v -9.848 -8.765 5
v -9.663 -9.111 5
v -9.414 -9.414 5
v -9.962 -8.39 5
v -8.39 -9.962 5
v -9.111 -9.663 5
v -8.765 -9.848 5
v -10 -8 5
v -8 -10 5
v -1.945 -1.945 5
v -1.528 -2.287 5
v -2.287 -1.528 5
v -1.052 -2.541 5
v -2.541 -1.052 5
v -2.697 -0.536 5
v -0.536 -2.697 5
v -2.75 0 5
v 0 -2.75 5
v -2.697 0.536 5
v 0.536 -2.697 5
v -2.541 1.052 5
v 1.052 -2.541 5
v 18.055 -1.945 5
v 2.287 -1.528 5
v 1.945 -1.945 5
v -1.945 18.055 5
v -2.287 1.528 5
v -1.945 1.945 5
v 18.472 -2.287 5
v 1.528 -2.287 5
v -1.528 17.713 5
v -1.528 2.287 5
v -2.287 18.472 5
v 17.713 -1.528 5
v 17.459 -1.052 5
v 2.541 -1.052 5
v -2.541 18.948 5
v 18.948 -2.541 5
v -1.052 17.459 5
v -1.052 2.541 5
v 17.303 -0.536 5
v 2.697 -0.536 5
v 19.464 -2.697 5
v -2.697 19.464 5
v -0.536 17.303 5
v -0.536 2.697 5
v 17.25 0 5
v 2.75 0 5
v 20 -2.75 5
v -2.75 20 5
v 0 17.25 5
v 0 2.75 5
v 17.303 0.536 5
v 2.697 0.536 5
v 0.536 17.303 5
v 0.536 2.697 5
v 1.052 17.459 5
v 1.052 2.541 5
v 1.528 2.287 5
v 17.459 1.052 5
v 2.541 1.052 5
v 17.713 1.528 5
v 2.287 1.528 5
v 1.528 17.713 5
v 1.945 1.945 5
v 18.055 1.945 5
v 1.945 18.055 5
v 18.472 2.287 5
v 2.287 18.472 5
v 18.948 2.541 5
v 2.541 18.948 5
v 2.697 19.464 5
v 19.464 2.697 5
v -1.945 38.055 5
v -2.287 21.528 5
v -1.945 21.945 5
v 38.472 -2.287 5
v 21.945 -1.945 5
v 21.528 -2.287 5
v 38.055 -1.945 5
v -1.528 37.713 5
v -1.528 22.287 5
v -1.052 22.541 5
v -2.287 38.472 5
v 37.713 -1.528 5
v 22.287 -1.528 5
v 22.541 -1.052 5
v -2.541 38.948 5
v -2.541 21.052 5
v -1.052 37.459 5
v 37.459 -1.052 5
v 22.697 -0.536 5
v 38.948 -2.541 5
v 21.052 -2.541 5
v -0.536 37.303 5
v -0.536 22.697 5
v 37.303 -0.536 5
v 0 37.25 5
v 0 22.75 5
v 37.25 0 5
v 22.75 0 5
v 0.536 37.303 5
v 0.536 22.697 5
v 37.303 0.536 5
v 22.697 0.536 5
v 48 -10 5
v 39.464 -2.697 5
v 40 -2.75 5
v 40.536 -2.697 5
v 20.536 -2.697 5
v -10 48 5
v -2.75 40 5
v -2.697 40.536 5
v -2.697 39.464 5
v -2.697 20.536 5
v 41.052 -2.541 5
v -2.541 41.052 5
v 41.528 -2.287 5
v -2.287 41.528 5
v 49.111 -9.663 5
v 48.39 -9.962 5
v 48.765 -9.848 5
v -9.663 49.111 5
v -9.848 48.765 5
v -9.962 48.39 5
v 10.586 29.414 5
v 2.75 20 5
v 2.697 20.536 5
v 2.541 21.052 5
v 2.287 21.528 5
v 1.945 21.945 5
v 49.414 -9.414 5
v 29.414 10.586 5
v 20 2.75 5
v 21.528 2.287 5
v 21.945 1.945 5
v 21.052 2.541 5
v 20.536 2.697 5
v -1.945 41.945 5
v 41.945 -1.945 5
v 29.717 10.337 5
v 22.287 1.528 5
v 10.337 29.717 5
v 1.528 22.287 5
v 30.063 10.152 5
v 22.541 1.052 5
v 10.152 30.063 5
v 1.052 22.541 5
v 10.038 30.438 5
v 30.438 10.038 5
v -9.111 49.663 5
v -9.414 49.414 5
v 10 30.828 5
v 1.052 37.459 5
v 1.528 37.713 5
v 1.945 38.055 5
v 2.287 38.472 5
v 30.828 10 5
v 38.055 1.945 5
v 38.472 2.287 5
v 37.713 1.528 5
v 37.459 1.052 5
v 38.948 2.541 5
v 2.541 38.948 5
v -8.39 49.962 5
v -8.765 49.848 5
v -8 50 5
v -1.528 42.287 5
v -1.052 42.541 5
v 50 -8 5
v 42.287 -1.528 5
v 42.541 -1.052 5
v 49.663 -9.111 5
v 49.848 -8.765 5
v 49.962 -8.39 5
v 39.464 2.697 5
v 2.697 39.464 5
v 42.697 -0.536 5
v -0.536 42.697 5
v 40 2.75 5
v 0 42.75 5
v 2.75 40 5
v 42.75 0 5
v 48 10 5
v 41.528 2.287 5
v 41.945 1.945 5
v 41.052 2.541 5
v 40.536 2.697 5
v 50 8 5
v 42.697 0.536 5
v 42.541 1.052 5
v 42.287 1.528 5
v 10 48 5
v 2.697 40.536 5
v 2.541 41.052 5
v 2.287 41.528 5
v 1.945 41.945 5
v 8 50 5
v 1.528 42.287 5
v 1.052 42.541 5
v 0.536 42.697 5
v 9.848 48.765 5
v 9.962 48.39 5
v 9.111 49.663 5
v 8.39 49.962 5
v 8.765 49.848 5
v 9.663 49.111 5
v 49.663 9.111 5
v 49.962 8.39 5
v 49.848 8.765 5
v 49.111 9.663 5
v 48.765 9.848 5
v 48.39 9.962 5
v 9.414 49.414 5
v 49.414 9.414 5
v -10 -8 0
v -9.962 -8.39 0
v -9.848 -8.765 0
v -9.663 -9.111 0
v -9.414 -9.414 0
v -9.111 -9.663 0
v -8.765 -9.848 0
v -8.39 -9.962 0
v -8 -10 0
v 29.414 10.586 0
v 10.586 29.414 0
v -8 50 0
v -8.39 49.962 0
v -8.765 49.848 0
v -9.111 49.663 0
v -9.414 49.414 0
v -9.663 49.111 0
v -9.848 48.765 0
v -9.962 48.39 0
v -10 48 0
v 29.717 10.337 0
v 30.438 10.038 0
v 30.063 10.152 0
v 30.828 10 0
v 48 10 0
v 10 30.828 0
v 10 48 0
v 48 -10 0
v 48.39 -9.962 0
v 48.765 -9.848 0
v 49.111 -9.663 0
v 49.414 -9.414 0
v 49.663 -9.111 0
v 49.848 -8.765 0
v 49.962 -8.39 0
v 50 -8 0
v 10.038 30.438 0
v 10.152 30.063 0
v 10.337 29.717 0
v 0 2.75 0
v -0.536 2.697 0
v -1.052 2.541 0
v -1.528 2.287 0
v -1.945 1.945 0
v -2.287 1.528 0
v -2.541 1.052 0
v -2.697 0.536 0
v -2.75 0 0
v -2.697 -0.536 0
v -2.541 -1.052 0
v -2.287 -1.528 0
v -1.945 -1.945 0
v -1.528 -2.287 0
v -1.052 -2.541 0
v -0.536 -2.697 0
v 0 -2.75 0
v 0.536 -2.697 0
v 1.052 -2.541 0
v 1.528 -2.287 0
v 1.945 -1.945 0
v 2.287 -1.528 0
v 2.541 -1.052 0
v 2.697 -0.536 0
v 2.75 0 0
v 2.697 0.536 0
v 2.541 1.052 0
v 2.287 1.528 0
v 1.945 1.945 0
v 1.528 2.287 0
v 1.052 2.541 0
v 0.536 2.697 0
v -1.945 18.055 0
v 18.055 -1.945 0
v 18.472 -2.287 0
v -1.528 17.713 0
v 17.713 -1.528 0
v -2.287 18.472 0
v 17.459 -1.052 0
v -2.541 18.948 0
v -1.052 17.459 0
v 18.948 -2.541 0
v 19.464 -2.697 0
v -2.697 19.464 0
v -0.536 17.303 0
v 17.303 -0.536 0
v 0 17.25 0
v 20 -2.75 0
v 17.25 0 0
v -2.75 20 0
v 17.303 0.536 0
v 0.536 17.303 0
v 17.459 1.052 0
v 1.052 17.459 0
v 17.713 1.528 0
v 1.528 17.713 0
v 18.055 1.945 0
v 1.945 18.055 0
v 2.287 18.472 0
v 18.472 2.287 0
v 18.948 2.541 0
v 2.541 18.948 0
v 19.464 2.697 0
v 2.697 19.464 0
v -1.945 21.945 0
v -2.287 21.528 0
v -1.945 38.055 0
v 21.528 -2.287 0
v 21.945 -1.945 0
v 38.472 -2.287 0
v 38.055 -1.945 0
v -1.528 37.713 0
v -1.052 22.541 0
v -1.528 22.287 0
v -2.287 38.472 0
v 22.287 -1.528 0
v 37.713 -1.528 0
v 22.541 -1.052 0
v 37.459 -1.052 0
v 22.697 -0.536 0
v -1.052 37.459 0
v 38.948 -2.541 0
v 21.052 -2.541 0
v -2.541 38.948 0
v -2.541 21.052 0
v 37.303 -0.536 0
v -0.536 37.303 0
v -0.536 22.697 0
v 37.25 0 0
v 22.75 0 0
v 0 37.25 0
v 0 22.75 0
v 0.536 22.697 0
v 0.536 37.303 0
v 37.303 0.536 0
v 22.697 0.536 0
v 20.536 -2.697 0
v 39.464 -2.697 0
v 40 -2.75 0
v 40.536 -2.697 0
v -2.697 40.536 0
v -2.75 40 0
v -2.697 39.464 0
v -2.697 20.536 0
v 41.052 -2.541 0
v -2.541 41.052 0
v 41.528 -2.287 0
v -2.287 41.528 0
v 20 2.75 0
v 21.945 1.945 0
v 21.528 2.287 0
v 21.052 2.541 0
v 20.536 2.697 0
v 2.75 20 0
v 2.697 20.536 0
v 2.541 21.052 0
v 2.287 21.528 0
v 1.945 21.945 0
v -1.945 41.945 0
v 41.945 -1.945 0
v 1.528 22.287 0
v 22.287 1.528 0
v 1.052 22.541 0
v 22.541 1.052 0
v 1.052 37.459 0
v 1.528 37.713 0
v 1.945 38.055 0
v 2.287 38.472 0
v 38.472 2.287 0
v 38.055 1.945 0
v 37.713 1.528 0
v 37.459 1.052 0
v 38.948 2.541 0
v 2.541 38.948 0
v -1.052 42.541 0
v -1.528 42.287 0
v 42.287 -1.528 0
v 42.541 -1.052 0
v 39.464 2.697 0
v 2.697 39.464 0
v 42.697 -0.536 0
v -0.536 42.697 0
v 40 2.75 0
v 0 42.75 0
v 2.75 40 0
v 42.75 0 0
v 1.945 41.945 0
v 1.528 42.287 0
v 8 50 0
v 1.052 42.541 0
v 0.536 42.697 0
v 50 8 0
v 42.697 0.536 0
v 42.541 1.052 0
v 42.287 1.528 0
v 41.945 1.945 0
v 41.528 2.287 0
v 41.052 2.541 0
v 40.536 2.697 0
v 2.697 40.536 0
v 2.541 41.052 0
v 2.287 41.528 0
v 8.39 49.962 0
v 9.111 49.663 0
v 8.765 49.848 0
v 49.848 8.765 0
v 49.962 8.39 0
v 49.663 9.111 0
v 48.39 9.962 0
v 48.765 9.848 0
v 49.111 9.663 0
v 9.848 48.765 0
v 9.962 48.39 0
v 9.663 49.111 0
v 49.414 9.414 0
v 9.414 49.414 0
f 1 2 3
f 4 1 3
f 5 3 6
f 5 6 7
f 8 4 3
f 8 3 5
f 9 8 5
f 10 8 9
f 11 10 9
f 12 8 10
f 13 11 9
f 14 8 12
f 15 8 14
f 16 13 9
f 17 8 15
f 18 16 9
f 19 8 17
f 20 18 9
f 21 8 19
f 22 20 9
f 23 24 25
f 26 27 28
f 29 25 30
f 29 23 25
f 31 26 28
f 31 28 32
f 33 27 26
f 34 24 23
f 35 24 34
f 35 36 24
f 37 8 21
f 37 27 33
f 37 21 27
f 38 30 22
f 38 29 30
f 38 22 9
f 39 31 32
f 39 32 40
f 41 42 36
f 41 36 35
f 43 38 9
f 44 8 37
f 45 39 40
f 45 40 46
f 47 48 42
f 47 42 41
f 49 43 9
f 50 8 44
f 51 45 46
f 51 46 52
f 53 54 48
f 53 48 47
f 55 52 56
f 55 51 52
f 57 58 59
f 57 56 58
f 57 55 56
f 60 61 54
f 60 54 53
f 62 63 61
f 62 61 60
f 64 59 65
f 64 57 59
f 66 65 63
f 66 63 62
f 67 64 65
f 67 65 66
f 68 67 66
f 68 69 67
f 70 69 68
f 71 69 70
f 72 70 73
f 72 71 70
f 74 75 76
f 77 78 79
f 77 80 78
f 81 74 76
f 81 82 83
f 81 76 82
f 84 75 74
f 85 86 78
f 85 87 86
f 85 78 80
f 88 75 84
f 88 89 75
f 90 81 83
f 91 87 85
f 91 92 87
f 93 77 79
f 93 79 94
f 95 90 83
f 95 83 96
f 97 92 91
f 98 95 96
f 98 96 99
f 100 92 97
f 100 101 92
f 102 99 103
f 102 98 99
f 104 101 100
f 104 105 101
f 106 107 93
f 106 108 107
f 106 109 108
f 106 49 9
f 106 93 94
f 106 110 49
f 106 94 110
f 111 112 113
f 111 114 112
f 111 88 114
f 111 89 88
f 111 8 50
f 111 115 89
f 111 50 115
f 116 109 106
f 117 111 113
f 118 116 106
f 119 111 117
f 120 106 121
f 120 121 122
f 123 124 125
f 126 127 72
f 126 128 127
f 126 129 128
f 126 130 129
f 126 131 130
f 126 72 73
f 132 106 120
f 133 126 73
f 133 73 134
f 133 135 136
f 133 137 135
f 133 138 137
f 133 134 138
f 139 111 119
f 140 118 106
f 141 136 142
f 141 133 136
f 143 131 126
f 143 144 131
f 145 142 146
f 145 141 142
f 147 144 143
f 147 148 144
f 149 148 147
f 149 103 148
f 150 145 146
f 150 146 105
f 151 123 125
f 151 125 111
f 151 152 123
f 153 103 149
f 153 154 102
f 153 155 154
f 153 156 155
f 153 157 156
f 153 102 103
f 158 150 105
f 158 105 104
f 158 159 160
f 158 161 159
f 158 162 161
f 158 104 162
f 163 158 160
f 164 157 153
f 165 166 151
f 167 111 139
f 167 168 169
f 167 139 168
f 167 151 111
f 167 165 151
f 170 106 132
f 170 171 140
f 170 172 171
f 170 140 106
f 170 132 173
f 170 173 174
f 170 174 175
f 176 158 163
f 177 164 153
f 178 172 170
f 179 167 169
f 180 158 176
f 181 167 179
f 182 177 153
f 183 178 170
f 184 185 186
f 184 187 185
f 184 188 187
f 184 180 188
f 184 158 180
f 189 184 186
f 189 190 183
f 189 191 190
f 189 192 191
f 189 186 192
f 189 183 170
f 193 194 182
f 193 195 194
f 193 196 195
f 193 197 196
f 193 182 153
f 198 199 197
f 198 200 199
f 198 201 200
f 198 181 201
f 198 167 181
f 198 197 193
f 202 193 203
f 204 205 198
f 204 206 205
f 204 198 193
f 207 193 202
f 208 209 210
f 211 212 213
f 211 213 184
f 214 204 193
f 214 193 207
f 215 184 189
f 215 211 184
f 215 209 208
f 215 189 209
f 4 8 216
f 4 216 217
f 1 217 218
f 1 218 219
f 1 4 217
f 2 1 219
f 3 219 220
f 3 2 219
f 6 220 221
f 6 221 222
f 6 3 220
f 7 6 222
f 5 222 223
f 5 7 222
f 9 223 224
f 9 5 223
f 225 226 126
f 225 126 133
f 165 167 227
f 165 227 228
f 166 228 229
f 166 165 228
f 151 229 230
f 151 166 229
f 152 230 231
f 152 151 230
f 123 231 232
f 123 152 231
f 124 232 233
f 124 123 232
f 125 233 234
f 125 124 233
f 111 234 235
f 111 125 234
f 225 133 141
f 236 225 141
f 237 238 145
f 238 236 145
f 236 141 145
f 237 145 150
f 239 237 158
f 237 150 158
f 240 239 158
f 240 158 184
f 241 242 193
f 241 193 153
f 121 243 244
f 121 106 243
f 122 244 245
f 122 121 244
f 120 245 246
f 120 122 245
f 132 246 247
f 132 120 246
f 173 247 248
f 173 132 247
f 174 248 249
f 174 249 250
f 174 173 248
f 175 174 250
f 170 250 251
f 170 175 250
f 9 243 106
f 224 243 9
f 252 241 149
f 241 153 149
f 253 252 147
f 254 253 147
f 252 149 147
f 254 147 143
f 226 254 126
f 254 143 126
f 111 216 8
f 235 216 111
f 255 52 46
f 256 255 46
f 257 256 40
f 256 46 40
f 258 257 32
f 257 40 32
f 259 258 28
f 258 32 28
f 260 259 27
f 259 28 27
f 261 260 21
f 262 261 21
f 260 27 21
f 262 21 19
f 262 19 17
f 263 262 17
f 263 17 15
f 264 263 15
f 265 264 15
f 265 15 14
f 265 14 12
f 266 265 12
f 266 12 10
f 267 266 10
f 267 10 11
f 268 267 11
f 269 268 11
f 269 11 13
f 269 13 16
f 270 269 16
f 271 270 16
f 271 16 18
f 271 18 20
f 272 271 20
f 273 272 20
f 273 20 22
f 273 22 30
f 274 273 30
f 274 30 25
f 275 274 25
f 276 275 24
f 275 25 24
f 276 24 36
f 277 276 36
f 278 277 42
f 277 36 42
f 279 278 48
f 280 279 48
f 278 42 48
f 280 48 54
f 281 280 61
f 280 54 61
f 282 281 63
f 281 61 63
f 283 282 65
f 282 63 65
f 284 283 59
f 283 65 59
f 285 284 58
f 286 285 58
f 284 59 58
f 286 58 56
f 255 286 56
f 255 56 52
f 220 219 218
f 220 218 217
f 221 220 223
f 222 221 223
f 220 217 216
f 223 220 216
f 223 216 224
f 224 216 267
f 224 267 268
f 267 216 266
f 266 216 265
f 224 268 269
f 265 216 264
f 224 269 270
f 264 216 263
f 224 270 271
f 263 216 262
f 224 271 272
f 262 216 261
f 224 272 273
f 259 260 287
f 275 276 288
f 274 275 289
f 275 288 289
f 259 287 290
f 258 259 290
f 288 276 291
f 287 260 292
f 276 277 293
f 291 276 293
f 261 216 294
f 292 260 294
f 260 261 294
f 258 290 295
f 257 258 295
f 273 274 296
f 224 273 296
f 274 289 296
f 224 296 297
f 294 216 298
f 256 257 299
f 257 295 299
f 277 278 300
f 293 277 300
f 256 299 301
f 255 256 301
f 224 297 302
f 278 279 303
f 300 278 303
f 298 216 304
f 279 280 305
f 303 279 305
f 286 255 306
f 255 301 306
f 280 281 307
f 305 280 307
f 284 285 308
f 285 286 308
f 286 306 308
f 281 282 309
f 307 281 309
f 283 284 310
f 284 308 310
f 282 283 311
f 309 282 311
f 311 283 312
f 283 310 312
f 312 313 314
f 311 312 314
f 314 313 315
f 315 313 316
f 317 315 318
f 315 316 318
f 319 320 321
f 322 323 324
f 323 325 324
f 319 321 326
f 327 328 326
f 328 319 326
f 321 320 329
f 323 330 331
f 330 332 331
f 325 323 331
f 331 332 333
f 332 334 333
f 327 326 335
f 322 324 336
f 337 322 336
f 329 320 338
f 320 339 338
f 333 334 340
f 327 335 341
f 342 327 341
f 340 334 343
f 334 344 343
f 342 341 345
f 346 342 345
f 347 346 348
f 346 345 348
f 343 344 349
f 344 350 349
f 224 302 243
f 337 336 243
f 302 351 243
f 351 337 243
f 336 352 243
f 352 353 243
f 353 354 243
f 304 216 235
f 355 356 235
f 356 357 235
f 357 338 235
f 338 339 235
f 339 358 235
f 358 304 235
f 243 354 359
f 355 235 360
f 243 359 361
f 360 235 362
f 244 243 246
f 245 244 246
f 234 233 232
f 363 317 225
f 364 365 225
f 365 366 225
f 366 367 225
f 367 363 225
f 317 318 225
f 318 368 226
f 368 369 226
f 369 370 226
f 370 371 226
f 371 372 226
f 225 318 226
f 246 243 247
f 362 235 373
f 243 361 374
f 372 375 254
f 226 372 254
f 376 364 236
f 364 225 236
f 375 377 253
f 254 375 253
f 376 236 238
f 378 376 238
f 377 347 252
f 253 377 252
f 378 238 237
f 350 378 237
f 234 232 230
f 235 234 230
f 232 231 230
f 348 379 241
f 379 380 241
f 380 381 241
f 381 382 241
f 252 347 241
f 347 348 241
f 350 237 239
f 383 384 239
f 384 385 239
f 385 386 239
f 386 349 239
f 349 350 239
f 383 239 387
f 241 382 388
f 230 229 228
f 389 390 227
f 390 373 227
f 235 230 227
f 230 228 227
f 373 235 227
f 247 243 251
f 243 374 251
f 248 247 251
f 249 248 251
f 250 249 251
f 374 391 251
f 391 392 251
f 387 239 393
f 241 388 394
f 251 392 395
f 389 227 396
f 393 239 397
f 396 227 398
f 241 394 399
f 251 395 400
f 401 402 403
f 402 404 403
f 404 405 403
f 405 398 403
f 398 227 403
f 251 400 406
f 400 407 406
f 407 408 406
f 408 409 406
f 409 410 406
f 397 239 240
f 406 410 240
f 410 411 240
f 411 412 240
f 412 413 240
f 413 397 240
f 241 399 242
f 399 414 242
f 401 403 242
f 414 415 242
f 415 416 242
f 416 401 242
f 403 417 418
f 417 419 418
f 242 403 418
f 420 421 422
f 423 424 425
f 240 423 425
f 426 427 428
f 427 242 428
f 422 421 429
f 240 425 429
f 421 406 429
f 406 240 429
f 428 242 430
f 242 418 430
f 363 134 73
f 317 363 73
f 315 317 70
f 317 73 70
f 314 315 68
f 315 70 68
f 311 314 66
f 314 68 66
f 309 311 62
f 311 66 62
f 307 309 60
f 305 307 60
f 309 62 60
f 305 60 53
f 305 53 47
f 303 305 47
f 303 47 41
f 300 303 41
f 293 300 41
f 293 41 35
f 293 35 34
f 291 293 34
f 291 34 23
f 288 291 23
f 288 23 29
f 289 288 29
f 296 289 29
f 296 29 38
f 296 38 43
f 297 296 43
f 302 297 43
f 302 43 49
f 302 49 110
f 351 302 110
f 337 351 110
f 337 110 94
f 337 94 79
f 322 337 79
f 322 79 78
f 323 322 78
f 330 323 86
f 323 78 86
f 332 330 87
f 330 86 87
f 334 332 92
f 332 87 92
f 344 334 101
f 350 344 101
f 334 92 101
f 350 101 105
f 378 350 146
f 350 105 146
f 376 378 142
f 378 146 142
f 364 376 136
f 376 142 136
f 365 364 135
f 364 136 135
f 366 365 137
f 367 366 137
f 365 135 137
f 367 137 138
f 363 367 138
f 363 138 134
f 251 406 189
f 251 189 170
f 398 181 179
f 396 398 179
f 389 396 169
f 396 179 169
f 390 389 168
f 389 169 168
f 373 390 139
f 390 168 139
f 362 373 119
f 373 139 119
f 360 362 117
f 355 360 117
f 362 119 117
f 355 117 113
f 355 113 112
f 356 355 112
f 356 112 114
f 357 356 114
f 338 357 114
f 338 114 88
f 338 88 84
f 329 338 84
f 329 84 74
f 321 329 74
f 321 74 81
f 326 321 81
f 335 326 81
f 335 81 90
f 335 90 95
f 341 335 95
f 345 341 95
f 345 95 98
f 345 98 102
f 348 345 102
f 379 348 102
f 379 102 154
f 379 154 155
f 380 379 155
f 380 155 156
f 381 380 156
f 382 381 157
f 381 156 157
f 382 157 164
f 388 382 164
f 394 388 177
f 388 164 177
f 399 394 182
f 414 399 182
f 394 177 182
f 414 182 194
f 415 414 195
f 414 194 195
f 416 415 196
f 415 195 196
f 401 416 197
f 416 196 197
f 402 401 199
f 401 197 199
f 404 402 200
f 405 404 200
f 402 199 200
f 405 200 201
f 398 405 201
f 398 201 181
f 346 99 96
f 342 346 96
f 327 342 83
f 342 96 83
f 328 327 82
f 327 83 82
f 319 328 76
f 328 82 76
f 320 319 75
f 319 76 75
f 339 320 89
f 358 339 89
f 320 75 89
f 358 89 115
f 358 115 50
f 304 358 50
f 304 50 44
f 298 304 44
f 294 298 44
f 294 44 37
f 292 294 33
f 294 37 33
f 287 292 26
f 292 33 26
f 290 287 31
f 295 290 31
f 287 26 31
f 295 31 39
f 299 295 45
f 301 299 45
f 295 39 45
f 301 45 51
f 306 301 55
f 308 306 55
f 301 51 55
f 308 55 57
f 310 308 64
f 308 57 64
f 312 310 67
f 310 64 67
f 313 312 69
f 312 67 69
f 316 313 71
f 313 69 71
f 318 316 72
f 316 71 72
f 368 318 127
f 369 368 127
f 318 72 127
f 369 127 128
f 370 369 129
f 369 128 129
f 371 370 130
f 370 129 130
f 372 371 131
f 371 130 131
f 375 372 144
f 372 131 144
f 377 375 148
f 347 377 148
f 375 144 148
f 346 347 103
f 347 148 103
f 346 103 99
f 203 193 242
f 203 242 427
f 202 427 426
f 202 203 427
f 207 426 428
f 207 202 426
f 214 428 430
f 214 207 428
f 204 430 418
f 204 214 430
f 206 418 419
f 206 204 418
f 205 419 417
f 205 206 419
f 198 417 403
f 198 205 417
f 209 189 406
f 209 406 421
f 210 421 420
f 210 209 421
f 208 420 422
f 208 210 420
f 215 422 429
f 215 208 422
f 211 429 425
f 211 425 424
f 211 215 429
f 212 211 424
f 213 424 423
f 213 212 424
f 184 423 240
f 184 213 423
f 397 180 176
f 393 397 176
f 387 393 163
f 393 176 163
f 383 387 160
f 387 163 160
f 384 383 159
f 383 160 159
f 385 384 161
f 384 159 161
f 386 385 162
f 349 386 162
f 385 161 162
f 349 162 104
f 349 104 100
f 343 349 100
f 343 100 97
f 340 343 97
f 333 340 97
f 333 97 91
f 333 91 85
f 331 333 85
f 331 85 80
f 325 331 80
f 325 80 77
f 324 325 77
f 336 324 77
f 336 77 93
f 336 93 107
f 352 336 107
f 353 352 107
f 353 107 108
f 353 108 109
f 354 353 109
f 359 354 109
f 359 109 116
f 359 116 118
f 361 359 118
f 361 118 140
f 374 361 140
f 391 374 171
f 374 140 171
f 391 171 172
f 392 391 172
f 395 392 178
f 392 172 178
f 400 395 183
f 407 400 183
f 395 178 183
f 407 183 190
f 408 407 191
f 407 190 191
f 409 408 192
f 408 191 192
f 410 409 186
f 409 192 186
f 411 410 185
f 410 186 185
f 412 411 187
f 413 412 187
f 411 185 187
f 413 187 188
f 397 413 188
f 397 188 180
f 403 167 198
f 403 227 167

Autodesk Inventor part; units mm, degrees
ref_plane "YZ Plane" through (0, 0, 0) normal (1, 0, 0) x (0, 1, 0)
ref_plane "XZ Plane" through (0, 0, 0) normal (0, 1, 0) x (-1, 0, 0)
ref_plane "XY Plane" through (0, 0, 0) normal (0, 0, 1) x (1, 0, 0)
sketch "Sketch2" plane through (0, 0, 0) normal (0, 0, 1) x (1, 0, 0)
  line L0 (0, 0) -> (0, 20) construction
  line L1 (0, 20) -> (0, 40) construction
  line L2 (0, 0) -> (20, 0) construction
  line L3 (20, 0) -> (40, 0) construction
  line L4 (-10, -10) -> (-10, 50)
  line L5 (-10, 50) -> (10, 50)
  line L6 (10, 50) -> (10, 30)
  line L7 (10, 30) -> (30, 10)
  line L8 (30, 10) -> (50, 10)
  line L9 (50, 10) -> (50, -10)
  line L10 (50, -10) -> (-10, -10)
  dimension "d0" = 20
  dimension "d1" = 20
  dimension "d2" = 60
  dimension "d3" = 10
  dimension "d4" = 10
  dimension "d5" = 10
extrude "Extrusion1" add sketch "Sketch2" along normal blind 5
hole "Hole1" at (0, 40, 0) at (0, 20, 0) at (20, 0, 0) at (40, 0, 0) at (0, 0, 0) direction (0, 0, 1) diameter 5.5 end through all clearance for "Flat Head Machine Screw" size "M5" standard "Ansi Metric M Profile"
fillet "Fillet1" radius 2 7 edges at (-10, 50, 2.5) (10, 50, 2.5) (10, 30, 2.5) (-10, -10, 2.5) (30, 10, 2.5) (50, 10, 2.5) (50, -10, 2.5)
properties part number "6060L"
